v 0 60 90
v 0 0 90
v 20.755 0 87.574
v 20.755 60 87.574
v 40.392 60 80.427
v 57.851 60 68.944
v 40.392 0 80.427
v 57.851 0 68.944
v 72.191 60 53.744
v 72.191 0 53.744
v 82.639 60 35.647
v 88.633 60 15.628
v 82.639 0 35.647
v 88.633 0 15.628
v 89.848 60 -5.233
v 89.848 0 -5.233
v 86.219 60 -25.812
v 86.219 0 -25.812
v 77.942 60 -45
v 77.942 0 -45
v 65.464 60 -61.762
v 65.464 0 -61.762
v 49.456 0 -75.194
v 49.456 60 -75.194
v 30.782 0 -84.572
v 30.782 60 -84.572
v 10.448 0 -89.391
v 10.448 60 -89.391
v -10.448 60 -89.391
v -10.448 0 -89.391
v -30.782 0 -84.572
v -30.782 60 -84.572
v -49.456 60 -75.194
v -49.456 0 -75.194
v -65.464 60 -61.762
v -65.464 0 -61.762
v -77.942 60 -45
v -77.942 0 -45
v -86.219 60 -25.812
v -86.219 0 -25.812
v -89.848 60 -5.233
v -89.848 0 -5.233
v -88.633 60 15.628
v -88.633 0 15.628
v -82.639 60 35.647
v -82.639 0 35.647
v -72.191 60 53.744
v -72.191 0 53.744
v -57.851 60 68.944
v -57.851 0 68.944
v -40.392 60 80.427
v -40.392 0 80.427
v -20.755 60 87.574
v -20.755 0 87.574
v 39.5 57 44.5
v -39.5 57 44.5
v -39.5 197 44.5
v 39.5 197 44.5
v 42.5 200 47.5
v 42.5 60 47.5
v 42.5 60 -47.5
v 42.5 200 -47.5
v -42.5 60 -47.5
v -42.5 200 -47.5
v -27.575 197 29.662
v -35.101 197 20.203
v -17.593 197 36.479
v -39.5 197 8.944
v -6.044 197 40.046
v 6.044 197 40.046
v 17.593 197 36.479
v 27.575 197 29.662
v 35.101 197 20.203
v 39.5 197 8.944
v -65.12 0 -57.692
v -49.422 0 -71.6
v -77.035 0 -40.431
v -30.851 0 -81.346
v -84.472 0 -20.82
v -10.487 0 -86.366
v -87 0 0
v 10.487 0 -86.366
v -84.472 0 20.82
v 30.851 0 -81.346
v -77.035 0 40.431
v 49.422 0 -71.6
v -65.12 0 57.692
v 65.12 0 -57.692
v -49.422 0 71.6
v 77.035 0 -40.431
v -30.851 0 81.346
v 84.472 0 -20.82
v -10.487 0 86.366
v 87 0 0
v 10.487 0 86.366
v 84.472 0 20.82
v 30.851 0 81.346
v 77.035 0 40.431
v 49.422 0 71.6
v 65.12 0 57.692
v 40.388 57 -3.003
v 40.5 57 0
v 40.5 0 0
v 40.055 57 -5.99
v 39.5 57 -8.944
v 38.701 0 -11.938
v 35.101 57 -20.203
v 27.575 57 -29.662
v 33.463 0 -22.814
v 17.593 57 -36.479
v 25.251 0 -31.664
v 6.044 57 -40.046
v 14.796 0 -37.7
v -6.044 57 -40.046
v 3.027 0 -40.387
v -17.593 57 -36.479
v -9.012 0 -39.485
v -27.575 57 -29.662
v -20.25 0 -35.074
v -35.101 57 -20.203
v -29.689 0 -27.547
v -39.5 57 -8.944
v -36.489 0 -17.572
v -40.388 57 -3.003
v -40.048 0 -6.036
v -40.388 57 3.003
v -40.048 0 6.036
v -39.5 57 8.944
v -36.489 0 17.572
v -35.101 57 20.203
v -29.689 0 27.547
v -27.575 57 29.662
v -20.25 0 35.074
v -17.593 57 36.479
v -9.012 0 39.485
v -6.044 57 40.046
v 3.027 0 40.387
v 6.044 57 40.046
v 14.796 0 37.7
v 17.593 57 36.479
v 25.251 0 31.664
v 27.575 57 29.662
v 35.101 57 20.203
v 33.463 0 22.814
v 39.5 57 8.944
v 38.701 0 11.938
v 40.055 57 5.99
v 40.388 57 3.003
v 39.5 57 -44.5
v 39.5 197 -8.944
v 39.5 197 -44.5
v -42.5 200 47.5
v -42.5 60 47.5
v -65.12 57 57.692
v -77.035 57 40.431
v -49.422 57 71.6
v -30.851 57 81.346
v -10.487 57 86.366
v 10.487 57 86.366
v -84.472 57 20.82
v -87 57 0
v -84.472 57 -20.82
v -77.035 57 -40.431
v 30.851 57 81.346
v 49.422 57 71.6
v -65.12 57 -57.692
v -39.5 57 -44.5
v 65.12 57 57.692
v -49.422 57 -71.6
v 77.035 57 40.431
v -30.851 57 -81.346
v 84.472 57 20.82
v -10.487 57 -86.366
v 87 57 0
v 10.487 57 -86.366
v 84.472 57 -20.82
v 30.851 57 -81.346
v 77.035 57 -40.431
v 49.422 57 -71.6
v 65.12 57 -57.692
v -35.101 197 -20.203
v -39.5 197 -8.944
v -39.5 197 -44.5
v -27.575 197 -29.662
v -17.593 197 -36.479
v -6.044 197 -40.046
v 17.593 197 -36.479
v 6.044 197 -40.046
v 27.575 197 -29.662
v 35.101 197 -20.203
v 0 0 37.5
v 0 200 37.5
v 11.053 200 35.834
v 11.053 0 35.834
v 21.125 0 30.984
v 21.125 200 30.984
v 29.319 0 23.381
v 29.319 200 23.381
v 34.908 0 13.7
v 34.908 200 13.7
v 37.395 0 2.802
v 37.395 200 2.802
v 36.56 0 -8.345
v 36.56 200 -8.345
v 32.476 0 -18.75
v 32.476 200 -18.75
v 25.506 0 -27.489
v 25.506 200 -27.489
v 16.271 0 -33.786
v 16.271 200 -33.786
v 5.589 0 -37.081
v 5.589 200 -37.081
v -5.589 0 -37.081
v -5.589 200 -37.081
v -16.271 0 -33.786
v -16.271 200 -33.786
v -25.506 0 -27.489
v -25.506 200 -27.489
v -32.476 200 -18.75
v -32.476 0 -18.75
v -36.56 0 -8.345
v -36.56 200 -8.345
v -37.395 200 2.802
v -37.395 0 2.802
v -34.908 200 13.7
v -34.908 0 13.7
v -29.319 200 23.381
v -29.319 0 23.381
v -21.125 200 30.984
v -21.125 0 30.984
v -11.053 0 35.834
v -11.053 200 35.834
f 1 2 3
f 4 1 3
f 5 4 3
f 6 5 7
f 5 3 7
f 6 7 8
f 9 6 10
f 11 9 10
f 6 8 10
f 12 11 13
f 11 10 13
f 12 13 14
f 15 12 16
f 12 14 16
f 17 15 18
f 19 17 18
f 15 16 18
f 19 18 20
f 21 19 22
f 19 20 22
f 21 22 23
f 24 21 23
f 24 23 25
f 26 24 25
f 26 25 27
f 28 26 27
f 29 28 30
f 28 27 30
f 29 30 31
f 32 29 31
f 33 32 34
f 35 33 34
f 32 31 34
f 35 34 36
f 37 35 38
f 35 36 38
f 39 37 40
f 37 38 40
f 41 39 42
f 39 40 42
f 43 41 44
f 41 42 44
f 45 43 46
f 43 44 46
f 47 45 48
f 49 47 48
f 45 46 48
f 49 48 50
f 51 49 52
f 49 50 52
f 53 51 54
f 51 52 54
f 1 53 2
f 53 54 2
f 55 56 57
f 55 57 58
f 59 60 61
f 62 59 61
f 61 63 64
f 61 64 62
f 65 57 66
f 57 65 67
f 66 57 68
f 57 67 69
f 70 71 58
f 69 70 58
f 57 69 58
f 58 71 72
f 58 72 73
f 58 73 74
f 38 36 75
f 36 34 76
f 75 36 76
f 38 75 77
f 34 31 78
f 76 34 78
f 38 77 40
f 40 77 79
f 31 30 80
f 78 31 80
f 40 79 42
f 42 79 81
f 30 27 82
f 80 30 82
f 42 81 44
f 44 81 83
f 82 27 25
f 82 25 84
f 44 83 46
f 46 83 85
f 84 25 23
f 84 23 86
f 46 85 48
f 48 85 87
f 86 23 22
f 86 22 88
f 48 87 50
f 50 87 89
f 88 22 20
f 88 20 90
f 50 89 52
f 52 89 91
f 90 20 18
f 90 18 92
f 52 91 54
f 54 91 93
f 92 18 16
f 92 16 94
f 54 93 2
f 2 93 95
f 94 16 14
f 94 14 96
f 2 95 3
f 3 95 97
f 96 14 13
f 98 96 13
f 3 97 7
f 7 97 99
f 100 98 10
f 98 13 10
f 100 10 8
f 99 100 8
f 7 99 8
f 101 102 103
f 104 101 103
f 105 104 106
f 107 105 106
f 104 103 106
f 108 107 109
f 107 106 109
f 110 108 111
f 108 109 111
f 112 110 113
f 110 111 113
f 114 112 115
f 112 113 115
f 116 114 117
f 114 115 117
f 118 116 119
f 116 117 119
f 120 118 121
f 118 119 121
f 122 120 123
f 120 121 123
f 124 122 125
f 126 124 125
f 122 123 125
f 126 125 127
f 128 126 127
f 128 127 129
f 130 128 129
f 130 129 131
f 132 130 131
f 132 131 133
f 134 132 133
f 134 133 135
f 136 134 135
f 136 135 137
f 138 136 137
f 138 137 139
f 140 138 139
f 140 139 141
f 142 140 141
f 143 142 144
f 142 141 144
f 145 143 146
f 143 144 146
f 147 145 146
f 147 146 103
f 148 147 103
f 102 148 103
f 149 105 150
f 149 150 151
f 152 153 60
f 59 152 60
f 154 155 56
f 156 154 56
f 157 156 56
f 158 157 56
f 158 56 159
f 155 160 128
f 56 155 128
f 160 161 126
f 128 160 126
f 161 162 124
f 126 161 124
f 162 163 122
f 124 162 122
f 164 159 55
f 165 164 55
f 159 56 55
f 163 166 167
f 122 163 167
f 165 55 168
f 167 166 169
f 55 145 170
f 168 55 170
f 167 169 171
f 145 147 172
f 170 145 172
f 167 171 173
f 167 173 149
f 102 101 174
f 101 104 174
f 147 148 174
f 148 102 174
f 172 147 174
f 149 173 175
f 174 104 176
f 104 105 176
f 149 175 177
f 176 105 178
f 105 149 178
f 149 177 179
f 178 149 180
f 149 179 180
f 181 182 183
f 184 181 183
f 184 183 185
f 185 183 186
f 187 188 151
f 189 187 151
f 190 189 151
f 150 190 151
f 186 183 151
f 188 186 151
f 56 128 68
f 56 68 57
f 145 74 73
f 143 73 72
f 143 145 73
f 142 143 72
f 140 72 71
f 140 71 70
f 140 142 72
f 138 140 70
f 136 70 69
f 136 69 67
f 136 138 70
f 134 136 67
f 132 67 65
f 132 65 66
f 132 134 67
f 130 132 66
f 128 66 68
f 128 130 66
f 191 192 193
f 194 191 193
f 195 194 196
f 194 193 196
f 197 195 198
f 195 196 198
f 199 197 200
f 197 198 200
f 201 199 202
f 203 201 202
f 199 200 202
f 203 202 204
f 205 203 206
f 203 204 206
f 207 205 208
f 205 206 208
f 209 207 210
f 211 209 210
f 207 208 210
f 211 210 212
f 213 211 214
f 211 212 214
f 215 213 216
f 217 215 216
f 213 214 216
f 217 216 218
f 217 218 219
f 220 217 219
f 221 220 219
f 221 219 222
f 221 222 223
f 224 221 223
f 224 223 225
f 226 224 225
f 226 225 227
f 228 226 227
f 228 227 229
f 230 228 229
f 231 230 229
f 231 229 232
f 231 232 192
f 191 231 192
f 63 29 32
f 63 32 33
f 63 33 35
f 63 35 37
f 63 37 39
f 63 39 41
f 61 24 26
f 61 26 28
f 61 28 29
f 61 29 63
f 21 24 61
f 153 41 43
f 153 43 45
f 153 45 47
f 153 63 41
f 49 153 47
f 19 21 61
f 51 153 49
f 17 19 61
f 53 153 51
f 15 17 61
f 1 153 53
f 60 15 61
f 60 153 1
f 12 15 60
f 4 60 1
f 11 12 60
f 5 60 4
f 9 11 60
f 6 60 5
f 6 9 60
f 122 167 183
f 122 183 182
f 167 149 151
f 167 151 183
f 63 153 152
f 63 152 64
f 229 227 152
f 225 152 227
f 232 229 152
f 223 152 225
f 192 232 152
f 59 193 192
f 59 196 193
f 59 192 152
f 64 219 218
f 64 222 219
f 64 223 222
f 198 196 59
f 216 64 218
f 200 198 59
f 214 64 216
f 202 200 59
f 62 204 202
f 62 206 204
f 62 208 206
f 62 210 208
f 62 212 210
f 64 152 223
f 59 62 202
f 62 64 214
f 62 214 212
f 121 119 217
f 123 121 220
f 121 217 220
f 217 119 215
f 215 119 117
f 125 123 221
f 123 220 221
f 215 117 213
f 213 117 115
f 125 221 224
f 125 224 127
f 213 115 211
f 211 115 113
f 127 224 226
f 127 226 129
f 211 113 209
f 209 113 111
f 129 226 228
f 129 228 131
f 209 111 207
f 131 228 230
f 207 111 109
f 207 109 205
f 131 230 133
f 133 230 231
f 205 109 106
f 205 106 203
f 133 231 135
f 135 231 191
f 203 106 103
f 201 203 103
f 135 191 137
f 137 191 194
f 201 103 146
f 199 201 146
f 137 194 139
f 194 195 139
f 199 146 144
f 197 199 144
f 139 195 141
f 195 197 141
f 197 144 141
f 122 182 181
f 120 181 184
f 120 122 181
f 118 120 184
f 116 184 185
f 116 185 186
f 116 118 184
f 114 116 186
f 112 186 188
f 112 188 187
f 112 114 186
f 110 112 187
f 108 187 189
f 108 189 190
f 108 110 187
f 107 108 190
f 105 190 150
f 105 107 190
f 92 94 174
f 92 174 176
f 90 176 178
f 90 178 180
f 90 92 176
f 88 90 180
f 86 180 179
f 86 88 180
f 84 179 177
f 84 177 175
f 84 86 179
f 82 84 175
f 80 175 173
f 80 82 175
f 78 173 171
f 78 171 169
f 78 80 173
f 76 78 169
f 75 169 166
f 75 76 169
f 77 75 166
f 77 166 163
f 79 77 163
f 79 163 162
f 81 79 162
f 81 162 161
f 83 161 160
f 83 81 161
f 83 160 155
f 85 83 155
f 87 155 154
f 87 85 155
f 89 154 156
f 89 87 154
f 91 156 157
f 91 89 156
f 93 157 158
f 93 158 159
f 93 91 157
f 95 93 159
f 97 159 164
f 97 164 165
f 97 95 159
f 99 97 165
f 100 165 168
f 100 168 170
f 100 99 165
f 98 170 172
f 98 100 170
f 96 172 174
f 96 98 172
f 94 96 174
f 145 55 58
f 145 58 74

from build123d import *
from build123d.topology import SkipClean

# Parameters (mm, degrees)
SKETCH_2_R            = 90
EXTRUDE_322_DEPTH     = 60
SKETCH_4_W            = 85
SKETCH_4_H            = 95
EXTRUDE_427_DEPTH     = 140
SKETCH_5_R            = 37.5
CUT_EXTRUDE_549_DEPTH = 238.065391823
SHELL_596_OUTLINE_R   = 87
SHELL_596_OUTLINE_R_2 = 40.5
SHELL_596_DEPTH       = 57
SHELL_START           = 57
SHELL_596_2_DEPTH     = 140


# Read off the part's stored shape, not the designer's step: Оболочка
with BuildPart() as part:
    # Эскиз2 → Extrude 322 (new body)
    with BuildSketch(Plane(origin=(0, 0, 0), x_dir=(1, 0, 0), z_dir=(0, 1, 0))):
        with Locations(Location((0, 0, 0), (0, 0, 270))):
            Circle(SKETCH_2_R)
    extrude(amount=EXTRUDE_322_DEPTH)

    # Эскиз4 → Extrude 427 (add)
    with BuildSketch(Plane(origin=(0, 60, 0), x_dir=(1, 0, 0), z_dir=(0, 1, 0))):
        Rectangle(SKETCH_4_W, SKETCH_4_H)
    extrude(amount=EXTRUDE_427_DEPTH)

    # Эскиз5 → Cut-Extrude 549 (cut, through all)
    with BuildSketch(Plane(origin=(0, 200, 0), x_dir=(1, 0, 0), z_dir=(0, 1, 0))):
        with Locations(Location((0, 0, 0), (0, 0, 270))):
            Circle(SKETCH_5_R)
    extrude(amount=-CUT_EXTRUDE_549_DEPTH, mode=Mode.SUBTRACT)

    # Shell 596 outline → Shell 596 (cut)
    with BuildSketch(Plane(origin=(0, 0, 0), x_dir=(1, 0, 0), z_dir=(0, 1, 0))):
        Circle(SHELL_596_OUTLINE_R)
        Circle(SHELL_596_OUTLINE_R_2, mode=Mode.SUBTRACT)
    extrude(amount=SHELL_596_DEPTH, mode=Mode.SUBTRACT)

    # Shell 596 2 outline → Shell 596 2 (cut)
    with SkipClean():  # the faces are left unmerged after this step: merging them gives an invalid solid
        with BuildSketch(Plane(origin=(0, 0, 0), x_dir=(1, 0, 0), z_dir=(0, 1, 0)).offset(SHELL_START)):
            with BuildLine():
                ThreePointArc((-39.5, 8.94427191), (0, 40.5), (39.5, 8.94427191))
                Line((39.5, 8.94427191), (39.5, 44.5))
                Line((39.5, 44.5), (-39.5, 44.5))
                Line((-39.5, 44.5), (-39.5, 8.94427191))
            make_face()
            with BuildLine():
                Line((39.5, -44.5), (39.5, -8.94427191))
                ThreePointArc((39.5, -8.94427191), (0, -40.5), (-39.5, -8.94427191))
                Line((-39.5, -8.94427191), (-39.5, -44.5))
                Line((-39.5, -44.5), (39.5, -44.5))
            make_face()
        extrude(amount=SHELL_596_2_DEPTH, mode=Mode.SUBTRACT)


solid = part.part
